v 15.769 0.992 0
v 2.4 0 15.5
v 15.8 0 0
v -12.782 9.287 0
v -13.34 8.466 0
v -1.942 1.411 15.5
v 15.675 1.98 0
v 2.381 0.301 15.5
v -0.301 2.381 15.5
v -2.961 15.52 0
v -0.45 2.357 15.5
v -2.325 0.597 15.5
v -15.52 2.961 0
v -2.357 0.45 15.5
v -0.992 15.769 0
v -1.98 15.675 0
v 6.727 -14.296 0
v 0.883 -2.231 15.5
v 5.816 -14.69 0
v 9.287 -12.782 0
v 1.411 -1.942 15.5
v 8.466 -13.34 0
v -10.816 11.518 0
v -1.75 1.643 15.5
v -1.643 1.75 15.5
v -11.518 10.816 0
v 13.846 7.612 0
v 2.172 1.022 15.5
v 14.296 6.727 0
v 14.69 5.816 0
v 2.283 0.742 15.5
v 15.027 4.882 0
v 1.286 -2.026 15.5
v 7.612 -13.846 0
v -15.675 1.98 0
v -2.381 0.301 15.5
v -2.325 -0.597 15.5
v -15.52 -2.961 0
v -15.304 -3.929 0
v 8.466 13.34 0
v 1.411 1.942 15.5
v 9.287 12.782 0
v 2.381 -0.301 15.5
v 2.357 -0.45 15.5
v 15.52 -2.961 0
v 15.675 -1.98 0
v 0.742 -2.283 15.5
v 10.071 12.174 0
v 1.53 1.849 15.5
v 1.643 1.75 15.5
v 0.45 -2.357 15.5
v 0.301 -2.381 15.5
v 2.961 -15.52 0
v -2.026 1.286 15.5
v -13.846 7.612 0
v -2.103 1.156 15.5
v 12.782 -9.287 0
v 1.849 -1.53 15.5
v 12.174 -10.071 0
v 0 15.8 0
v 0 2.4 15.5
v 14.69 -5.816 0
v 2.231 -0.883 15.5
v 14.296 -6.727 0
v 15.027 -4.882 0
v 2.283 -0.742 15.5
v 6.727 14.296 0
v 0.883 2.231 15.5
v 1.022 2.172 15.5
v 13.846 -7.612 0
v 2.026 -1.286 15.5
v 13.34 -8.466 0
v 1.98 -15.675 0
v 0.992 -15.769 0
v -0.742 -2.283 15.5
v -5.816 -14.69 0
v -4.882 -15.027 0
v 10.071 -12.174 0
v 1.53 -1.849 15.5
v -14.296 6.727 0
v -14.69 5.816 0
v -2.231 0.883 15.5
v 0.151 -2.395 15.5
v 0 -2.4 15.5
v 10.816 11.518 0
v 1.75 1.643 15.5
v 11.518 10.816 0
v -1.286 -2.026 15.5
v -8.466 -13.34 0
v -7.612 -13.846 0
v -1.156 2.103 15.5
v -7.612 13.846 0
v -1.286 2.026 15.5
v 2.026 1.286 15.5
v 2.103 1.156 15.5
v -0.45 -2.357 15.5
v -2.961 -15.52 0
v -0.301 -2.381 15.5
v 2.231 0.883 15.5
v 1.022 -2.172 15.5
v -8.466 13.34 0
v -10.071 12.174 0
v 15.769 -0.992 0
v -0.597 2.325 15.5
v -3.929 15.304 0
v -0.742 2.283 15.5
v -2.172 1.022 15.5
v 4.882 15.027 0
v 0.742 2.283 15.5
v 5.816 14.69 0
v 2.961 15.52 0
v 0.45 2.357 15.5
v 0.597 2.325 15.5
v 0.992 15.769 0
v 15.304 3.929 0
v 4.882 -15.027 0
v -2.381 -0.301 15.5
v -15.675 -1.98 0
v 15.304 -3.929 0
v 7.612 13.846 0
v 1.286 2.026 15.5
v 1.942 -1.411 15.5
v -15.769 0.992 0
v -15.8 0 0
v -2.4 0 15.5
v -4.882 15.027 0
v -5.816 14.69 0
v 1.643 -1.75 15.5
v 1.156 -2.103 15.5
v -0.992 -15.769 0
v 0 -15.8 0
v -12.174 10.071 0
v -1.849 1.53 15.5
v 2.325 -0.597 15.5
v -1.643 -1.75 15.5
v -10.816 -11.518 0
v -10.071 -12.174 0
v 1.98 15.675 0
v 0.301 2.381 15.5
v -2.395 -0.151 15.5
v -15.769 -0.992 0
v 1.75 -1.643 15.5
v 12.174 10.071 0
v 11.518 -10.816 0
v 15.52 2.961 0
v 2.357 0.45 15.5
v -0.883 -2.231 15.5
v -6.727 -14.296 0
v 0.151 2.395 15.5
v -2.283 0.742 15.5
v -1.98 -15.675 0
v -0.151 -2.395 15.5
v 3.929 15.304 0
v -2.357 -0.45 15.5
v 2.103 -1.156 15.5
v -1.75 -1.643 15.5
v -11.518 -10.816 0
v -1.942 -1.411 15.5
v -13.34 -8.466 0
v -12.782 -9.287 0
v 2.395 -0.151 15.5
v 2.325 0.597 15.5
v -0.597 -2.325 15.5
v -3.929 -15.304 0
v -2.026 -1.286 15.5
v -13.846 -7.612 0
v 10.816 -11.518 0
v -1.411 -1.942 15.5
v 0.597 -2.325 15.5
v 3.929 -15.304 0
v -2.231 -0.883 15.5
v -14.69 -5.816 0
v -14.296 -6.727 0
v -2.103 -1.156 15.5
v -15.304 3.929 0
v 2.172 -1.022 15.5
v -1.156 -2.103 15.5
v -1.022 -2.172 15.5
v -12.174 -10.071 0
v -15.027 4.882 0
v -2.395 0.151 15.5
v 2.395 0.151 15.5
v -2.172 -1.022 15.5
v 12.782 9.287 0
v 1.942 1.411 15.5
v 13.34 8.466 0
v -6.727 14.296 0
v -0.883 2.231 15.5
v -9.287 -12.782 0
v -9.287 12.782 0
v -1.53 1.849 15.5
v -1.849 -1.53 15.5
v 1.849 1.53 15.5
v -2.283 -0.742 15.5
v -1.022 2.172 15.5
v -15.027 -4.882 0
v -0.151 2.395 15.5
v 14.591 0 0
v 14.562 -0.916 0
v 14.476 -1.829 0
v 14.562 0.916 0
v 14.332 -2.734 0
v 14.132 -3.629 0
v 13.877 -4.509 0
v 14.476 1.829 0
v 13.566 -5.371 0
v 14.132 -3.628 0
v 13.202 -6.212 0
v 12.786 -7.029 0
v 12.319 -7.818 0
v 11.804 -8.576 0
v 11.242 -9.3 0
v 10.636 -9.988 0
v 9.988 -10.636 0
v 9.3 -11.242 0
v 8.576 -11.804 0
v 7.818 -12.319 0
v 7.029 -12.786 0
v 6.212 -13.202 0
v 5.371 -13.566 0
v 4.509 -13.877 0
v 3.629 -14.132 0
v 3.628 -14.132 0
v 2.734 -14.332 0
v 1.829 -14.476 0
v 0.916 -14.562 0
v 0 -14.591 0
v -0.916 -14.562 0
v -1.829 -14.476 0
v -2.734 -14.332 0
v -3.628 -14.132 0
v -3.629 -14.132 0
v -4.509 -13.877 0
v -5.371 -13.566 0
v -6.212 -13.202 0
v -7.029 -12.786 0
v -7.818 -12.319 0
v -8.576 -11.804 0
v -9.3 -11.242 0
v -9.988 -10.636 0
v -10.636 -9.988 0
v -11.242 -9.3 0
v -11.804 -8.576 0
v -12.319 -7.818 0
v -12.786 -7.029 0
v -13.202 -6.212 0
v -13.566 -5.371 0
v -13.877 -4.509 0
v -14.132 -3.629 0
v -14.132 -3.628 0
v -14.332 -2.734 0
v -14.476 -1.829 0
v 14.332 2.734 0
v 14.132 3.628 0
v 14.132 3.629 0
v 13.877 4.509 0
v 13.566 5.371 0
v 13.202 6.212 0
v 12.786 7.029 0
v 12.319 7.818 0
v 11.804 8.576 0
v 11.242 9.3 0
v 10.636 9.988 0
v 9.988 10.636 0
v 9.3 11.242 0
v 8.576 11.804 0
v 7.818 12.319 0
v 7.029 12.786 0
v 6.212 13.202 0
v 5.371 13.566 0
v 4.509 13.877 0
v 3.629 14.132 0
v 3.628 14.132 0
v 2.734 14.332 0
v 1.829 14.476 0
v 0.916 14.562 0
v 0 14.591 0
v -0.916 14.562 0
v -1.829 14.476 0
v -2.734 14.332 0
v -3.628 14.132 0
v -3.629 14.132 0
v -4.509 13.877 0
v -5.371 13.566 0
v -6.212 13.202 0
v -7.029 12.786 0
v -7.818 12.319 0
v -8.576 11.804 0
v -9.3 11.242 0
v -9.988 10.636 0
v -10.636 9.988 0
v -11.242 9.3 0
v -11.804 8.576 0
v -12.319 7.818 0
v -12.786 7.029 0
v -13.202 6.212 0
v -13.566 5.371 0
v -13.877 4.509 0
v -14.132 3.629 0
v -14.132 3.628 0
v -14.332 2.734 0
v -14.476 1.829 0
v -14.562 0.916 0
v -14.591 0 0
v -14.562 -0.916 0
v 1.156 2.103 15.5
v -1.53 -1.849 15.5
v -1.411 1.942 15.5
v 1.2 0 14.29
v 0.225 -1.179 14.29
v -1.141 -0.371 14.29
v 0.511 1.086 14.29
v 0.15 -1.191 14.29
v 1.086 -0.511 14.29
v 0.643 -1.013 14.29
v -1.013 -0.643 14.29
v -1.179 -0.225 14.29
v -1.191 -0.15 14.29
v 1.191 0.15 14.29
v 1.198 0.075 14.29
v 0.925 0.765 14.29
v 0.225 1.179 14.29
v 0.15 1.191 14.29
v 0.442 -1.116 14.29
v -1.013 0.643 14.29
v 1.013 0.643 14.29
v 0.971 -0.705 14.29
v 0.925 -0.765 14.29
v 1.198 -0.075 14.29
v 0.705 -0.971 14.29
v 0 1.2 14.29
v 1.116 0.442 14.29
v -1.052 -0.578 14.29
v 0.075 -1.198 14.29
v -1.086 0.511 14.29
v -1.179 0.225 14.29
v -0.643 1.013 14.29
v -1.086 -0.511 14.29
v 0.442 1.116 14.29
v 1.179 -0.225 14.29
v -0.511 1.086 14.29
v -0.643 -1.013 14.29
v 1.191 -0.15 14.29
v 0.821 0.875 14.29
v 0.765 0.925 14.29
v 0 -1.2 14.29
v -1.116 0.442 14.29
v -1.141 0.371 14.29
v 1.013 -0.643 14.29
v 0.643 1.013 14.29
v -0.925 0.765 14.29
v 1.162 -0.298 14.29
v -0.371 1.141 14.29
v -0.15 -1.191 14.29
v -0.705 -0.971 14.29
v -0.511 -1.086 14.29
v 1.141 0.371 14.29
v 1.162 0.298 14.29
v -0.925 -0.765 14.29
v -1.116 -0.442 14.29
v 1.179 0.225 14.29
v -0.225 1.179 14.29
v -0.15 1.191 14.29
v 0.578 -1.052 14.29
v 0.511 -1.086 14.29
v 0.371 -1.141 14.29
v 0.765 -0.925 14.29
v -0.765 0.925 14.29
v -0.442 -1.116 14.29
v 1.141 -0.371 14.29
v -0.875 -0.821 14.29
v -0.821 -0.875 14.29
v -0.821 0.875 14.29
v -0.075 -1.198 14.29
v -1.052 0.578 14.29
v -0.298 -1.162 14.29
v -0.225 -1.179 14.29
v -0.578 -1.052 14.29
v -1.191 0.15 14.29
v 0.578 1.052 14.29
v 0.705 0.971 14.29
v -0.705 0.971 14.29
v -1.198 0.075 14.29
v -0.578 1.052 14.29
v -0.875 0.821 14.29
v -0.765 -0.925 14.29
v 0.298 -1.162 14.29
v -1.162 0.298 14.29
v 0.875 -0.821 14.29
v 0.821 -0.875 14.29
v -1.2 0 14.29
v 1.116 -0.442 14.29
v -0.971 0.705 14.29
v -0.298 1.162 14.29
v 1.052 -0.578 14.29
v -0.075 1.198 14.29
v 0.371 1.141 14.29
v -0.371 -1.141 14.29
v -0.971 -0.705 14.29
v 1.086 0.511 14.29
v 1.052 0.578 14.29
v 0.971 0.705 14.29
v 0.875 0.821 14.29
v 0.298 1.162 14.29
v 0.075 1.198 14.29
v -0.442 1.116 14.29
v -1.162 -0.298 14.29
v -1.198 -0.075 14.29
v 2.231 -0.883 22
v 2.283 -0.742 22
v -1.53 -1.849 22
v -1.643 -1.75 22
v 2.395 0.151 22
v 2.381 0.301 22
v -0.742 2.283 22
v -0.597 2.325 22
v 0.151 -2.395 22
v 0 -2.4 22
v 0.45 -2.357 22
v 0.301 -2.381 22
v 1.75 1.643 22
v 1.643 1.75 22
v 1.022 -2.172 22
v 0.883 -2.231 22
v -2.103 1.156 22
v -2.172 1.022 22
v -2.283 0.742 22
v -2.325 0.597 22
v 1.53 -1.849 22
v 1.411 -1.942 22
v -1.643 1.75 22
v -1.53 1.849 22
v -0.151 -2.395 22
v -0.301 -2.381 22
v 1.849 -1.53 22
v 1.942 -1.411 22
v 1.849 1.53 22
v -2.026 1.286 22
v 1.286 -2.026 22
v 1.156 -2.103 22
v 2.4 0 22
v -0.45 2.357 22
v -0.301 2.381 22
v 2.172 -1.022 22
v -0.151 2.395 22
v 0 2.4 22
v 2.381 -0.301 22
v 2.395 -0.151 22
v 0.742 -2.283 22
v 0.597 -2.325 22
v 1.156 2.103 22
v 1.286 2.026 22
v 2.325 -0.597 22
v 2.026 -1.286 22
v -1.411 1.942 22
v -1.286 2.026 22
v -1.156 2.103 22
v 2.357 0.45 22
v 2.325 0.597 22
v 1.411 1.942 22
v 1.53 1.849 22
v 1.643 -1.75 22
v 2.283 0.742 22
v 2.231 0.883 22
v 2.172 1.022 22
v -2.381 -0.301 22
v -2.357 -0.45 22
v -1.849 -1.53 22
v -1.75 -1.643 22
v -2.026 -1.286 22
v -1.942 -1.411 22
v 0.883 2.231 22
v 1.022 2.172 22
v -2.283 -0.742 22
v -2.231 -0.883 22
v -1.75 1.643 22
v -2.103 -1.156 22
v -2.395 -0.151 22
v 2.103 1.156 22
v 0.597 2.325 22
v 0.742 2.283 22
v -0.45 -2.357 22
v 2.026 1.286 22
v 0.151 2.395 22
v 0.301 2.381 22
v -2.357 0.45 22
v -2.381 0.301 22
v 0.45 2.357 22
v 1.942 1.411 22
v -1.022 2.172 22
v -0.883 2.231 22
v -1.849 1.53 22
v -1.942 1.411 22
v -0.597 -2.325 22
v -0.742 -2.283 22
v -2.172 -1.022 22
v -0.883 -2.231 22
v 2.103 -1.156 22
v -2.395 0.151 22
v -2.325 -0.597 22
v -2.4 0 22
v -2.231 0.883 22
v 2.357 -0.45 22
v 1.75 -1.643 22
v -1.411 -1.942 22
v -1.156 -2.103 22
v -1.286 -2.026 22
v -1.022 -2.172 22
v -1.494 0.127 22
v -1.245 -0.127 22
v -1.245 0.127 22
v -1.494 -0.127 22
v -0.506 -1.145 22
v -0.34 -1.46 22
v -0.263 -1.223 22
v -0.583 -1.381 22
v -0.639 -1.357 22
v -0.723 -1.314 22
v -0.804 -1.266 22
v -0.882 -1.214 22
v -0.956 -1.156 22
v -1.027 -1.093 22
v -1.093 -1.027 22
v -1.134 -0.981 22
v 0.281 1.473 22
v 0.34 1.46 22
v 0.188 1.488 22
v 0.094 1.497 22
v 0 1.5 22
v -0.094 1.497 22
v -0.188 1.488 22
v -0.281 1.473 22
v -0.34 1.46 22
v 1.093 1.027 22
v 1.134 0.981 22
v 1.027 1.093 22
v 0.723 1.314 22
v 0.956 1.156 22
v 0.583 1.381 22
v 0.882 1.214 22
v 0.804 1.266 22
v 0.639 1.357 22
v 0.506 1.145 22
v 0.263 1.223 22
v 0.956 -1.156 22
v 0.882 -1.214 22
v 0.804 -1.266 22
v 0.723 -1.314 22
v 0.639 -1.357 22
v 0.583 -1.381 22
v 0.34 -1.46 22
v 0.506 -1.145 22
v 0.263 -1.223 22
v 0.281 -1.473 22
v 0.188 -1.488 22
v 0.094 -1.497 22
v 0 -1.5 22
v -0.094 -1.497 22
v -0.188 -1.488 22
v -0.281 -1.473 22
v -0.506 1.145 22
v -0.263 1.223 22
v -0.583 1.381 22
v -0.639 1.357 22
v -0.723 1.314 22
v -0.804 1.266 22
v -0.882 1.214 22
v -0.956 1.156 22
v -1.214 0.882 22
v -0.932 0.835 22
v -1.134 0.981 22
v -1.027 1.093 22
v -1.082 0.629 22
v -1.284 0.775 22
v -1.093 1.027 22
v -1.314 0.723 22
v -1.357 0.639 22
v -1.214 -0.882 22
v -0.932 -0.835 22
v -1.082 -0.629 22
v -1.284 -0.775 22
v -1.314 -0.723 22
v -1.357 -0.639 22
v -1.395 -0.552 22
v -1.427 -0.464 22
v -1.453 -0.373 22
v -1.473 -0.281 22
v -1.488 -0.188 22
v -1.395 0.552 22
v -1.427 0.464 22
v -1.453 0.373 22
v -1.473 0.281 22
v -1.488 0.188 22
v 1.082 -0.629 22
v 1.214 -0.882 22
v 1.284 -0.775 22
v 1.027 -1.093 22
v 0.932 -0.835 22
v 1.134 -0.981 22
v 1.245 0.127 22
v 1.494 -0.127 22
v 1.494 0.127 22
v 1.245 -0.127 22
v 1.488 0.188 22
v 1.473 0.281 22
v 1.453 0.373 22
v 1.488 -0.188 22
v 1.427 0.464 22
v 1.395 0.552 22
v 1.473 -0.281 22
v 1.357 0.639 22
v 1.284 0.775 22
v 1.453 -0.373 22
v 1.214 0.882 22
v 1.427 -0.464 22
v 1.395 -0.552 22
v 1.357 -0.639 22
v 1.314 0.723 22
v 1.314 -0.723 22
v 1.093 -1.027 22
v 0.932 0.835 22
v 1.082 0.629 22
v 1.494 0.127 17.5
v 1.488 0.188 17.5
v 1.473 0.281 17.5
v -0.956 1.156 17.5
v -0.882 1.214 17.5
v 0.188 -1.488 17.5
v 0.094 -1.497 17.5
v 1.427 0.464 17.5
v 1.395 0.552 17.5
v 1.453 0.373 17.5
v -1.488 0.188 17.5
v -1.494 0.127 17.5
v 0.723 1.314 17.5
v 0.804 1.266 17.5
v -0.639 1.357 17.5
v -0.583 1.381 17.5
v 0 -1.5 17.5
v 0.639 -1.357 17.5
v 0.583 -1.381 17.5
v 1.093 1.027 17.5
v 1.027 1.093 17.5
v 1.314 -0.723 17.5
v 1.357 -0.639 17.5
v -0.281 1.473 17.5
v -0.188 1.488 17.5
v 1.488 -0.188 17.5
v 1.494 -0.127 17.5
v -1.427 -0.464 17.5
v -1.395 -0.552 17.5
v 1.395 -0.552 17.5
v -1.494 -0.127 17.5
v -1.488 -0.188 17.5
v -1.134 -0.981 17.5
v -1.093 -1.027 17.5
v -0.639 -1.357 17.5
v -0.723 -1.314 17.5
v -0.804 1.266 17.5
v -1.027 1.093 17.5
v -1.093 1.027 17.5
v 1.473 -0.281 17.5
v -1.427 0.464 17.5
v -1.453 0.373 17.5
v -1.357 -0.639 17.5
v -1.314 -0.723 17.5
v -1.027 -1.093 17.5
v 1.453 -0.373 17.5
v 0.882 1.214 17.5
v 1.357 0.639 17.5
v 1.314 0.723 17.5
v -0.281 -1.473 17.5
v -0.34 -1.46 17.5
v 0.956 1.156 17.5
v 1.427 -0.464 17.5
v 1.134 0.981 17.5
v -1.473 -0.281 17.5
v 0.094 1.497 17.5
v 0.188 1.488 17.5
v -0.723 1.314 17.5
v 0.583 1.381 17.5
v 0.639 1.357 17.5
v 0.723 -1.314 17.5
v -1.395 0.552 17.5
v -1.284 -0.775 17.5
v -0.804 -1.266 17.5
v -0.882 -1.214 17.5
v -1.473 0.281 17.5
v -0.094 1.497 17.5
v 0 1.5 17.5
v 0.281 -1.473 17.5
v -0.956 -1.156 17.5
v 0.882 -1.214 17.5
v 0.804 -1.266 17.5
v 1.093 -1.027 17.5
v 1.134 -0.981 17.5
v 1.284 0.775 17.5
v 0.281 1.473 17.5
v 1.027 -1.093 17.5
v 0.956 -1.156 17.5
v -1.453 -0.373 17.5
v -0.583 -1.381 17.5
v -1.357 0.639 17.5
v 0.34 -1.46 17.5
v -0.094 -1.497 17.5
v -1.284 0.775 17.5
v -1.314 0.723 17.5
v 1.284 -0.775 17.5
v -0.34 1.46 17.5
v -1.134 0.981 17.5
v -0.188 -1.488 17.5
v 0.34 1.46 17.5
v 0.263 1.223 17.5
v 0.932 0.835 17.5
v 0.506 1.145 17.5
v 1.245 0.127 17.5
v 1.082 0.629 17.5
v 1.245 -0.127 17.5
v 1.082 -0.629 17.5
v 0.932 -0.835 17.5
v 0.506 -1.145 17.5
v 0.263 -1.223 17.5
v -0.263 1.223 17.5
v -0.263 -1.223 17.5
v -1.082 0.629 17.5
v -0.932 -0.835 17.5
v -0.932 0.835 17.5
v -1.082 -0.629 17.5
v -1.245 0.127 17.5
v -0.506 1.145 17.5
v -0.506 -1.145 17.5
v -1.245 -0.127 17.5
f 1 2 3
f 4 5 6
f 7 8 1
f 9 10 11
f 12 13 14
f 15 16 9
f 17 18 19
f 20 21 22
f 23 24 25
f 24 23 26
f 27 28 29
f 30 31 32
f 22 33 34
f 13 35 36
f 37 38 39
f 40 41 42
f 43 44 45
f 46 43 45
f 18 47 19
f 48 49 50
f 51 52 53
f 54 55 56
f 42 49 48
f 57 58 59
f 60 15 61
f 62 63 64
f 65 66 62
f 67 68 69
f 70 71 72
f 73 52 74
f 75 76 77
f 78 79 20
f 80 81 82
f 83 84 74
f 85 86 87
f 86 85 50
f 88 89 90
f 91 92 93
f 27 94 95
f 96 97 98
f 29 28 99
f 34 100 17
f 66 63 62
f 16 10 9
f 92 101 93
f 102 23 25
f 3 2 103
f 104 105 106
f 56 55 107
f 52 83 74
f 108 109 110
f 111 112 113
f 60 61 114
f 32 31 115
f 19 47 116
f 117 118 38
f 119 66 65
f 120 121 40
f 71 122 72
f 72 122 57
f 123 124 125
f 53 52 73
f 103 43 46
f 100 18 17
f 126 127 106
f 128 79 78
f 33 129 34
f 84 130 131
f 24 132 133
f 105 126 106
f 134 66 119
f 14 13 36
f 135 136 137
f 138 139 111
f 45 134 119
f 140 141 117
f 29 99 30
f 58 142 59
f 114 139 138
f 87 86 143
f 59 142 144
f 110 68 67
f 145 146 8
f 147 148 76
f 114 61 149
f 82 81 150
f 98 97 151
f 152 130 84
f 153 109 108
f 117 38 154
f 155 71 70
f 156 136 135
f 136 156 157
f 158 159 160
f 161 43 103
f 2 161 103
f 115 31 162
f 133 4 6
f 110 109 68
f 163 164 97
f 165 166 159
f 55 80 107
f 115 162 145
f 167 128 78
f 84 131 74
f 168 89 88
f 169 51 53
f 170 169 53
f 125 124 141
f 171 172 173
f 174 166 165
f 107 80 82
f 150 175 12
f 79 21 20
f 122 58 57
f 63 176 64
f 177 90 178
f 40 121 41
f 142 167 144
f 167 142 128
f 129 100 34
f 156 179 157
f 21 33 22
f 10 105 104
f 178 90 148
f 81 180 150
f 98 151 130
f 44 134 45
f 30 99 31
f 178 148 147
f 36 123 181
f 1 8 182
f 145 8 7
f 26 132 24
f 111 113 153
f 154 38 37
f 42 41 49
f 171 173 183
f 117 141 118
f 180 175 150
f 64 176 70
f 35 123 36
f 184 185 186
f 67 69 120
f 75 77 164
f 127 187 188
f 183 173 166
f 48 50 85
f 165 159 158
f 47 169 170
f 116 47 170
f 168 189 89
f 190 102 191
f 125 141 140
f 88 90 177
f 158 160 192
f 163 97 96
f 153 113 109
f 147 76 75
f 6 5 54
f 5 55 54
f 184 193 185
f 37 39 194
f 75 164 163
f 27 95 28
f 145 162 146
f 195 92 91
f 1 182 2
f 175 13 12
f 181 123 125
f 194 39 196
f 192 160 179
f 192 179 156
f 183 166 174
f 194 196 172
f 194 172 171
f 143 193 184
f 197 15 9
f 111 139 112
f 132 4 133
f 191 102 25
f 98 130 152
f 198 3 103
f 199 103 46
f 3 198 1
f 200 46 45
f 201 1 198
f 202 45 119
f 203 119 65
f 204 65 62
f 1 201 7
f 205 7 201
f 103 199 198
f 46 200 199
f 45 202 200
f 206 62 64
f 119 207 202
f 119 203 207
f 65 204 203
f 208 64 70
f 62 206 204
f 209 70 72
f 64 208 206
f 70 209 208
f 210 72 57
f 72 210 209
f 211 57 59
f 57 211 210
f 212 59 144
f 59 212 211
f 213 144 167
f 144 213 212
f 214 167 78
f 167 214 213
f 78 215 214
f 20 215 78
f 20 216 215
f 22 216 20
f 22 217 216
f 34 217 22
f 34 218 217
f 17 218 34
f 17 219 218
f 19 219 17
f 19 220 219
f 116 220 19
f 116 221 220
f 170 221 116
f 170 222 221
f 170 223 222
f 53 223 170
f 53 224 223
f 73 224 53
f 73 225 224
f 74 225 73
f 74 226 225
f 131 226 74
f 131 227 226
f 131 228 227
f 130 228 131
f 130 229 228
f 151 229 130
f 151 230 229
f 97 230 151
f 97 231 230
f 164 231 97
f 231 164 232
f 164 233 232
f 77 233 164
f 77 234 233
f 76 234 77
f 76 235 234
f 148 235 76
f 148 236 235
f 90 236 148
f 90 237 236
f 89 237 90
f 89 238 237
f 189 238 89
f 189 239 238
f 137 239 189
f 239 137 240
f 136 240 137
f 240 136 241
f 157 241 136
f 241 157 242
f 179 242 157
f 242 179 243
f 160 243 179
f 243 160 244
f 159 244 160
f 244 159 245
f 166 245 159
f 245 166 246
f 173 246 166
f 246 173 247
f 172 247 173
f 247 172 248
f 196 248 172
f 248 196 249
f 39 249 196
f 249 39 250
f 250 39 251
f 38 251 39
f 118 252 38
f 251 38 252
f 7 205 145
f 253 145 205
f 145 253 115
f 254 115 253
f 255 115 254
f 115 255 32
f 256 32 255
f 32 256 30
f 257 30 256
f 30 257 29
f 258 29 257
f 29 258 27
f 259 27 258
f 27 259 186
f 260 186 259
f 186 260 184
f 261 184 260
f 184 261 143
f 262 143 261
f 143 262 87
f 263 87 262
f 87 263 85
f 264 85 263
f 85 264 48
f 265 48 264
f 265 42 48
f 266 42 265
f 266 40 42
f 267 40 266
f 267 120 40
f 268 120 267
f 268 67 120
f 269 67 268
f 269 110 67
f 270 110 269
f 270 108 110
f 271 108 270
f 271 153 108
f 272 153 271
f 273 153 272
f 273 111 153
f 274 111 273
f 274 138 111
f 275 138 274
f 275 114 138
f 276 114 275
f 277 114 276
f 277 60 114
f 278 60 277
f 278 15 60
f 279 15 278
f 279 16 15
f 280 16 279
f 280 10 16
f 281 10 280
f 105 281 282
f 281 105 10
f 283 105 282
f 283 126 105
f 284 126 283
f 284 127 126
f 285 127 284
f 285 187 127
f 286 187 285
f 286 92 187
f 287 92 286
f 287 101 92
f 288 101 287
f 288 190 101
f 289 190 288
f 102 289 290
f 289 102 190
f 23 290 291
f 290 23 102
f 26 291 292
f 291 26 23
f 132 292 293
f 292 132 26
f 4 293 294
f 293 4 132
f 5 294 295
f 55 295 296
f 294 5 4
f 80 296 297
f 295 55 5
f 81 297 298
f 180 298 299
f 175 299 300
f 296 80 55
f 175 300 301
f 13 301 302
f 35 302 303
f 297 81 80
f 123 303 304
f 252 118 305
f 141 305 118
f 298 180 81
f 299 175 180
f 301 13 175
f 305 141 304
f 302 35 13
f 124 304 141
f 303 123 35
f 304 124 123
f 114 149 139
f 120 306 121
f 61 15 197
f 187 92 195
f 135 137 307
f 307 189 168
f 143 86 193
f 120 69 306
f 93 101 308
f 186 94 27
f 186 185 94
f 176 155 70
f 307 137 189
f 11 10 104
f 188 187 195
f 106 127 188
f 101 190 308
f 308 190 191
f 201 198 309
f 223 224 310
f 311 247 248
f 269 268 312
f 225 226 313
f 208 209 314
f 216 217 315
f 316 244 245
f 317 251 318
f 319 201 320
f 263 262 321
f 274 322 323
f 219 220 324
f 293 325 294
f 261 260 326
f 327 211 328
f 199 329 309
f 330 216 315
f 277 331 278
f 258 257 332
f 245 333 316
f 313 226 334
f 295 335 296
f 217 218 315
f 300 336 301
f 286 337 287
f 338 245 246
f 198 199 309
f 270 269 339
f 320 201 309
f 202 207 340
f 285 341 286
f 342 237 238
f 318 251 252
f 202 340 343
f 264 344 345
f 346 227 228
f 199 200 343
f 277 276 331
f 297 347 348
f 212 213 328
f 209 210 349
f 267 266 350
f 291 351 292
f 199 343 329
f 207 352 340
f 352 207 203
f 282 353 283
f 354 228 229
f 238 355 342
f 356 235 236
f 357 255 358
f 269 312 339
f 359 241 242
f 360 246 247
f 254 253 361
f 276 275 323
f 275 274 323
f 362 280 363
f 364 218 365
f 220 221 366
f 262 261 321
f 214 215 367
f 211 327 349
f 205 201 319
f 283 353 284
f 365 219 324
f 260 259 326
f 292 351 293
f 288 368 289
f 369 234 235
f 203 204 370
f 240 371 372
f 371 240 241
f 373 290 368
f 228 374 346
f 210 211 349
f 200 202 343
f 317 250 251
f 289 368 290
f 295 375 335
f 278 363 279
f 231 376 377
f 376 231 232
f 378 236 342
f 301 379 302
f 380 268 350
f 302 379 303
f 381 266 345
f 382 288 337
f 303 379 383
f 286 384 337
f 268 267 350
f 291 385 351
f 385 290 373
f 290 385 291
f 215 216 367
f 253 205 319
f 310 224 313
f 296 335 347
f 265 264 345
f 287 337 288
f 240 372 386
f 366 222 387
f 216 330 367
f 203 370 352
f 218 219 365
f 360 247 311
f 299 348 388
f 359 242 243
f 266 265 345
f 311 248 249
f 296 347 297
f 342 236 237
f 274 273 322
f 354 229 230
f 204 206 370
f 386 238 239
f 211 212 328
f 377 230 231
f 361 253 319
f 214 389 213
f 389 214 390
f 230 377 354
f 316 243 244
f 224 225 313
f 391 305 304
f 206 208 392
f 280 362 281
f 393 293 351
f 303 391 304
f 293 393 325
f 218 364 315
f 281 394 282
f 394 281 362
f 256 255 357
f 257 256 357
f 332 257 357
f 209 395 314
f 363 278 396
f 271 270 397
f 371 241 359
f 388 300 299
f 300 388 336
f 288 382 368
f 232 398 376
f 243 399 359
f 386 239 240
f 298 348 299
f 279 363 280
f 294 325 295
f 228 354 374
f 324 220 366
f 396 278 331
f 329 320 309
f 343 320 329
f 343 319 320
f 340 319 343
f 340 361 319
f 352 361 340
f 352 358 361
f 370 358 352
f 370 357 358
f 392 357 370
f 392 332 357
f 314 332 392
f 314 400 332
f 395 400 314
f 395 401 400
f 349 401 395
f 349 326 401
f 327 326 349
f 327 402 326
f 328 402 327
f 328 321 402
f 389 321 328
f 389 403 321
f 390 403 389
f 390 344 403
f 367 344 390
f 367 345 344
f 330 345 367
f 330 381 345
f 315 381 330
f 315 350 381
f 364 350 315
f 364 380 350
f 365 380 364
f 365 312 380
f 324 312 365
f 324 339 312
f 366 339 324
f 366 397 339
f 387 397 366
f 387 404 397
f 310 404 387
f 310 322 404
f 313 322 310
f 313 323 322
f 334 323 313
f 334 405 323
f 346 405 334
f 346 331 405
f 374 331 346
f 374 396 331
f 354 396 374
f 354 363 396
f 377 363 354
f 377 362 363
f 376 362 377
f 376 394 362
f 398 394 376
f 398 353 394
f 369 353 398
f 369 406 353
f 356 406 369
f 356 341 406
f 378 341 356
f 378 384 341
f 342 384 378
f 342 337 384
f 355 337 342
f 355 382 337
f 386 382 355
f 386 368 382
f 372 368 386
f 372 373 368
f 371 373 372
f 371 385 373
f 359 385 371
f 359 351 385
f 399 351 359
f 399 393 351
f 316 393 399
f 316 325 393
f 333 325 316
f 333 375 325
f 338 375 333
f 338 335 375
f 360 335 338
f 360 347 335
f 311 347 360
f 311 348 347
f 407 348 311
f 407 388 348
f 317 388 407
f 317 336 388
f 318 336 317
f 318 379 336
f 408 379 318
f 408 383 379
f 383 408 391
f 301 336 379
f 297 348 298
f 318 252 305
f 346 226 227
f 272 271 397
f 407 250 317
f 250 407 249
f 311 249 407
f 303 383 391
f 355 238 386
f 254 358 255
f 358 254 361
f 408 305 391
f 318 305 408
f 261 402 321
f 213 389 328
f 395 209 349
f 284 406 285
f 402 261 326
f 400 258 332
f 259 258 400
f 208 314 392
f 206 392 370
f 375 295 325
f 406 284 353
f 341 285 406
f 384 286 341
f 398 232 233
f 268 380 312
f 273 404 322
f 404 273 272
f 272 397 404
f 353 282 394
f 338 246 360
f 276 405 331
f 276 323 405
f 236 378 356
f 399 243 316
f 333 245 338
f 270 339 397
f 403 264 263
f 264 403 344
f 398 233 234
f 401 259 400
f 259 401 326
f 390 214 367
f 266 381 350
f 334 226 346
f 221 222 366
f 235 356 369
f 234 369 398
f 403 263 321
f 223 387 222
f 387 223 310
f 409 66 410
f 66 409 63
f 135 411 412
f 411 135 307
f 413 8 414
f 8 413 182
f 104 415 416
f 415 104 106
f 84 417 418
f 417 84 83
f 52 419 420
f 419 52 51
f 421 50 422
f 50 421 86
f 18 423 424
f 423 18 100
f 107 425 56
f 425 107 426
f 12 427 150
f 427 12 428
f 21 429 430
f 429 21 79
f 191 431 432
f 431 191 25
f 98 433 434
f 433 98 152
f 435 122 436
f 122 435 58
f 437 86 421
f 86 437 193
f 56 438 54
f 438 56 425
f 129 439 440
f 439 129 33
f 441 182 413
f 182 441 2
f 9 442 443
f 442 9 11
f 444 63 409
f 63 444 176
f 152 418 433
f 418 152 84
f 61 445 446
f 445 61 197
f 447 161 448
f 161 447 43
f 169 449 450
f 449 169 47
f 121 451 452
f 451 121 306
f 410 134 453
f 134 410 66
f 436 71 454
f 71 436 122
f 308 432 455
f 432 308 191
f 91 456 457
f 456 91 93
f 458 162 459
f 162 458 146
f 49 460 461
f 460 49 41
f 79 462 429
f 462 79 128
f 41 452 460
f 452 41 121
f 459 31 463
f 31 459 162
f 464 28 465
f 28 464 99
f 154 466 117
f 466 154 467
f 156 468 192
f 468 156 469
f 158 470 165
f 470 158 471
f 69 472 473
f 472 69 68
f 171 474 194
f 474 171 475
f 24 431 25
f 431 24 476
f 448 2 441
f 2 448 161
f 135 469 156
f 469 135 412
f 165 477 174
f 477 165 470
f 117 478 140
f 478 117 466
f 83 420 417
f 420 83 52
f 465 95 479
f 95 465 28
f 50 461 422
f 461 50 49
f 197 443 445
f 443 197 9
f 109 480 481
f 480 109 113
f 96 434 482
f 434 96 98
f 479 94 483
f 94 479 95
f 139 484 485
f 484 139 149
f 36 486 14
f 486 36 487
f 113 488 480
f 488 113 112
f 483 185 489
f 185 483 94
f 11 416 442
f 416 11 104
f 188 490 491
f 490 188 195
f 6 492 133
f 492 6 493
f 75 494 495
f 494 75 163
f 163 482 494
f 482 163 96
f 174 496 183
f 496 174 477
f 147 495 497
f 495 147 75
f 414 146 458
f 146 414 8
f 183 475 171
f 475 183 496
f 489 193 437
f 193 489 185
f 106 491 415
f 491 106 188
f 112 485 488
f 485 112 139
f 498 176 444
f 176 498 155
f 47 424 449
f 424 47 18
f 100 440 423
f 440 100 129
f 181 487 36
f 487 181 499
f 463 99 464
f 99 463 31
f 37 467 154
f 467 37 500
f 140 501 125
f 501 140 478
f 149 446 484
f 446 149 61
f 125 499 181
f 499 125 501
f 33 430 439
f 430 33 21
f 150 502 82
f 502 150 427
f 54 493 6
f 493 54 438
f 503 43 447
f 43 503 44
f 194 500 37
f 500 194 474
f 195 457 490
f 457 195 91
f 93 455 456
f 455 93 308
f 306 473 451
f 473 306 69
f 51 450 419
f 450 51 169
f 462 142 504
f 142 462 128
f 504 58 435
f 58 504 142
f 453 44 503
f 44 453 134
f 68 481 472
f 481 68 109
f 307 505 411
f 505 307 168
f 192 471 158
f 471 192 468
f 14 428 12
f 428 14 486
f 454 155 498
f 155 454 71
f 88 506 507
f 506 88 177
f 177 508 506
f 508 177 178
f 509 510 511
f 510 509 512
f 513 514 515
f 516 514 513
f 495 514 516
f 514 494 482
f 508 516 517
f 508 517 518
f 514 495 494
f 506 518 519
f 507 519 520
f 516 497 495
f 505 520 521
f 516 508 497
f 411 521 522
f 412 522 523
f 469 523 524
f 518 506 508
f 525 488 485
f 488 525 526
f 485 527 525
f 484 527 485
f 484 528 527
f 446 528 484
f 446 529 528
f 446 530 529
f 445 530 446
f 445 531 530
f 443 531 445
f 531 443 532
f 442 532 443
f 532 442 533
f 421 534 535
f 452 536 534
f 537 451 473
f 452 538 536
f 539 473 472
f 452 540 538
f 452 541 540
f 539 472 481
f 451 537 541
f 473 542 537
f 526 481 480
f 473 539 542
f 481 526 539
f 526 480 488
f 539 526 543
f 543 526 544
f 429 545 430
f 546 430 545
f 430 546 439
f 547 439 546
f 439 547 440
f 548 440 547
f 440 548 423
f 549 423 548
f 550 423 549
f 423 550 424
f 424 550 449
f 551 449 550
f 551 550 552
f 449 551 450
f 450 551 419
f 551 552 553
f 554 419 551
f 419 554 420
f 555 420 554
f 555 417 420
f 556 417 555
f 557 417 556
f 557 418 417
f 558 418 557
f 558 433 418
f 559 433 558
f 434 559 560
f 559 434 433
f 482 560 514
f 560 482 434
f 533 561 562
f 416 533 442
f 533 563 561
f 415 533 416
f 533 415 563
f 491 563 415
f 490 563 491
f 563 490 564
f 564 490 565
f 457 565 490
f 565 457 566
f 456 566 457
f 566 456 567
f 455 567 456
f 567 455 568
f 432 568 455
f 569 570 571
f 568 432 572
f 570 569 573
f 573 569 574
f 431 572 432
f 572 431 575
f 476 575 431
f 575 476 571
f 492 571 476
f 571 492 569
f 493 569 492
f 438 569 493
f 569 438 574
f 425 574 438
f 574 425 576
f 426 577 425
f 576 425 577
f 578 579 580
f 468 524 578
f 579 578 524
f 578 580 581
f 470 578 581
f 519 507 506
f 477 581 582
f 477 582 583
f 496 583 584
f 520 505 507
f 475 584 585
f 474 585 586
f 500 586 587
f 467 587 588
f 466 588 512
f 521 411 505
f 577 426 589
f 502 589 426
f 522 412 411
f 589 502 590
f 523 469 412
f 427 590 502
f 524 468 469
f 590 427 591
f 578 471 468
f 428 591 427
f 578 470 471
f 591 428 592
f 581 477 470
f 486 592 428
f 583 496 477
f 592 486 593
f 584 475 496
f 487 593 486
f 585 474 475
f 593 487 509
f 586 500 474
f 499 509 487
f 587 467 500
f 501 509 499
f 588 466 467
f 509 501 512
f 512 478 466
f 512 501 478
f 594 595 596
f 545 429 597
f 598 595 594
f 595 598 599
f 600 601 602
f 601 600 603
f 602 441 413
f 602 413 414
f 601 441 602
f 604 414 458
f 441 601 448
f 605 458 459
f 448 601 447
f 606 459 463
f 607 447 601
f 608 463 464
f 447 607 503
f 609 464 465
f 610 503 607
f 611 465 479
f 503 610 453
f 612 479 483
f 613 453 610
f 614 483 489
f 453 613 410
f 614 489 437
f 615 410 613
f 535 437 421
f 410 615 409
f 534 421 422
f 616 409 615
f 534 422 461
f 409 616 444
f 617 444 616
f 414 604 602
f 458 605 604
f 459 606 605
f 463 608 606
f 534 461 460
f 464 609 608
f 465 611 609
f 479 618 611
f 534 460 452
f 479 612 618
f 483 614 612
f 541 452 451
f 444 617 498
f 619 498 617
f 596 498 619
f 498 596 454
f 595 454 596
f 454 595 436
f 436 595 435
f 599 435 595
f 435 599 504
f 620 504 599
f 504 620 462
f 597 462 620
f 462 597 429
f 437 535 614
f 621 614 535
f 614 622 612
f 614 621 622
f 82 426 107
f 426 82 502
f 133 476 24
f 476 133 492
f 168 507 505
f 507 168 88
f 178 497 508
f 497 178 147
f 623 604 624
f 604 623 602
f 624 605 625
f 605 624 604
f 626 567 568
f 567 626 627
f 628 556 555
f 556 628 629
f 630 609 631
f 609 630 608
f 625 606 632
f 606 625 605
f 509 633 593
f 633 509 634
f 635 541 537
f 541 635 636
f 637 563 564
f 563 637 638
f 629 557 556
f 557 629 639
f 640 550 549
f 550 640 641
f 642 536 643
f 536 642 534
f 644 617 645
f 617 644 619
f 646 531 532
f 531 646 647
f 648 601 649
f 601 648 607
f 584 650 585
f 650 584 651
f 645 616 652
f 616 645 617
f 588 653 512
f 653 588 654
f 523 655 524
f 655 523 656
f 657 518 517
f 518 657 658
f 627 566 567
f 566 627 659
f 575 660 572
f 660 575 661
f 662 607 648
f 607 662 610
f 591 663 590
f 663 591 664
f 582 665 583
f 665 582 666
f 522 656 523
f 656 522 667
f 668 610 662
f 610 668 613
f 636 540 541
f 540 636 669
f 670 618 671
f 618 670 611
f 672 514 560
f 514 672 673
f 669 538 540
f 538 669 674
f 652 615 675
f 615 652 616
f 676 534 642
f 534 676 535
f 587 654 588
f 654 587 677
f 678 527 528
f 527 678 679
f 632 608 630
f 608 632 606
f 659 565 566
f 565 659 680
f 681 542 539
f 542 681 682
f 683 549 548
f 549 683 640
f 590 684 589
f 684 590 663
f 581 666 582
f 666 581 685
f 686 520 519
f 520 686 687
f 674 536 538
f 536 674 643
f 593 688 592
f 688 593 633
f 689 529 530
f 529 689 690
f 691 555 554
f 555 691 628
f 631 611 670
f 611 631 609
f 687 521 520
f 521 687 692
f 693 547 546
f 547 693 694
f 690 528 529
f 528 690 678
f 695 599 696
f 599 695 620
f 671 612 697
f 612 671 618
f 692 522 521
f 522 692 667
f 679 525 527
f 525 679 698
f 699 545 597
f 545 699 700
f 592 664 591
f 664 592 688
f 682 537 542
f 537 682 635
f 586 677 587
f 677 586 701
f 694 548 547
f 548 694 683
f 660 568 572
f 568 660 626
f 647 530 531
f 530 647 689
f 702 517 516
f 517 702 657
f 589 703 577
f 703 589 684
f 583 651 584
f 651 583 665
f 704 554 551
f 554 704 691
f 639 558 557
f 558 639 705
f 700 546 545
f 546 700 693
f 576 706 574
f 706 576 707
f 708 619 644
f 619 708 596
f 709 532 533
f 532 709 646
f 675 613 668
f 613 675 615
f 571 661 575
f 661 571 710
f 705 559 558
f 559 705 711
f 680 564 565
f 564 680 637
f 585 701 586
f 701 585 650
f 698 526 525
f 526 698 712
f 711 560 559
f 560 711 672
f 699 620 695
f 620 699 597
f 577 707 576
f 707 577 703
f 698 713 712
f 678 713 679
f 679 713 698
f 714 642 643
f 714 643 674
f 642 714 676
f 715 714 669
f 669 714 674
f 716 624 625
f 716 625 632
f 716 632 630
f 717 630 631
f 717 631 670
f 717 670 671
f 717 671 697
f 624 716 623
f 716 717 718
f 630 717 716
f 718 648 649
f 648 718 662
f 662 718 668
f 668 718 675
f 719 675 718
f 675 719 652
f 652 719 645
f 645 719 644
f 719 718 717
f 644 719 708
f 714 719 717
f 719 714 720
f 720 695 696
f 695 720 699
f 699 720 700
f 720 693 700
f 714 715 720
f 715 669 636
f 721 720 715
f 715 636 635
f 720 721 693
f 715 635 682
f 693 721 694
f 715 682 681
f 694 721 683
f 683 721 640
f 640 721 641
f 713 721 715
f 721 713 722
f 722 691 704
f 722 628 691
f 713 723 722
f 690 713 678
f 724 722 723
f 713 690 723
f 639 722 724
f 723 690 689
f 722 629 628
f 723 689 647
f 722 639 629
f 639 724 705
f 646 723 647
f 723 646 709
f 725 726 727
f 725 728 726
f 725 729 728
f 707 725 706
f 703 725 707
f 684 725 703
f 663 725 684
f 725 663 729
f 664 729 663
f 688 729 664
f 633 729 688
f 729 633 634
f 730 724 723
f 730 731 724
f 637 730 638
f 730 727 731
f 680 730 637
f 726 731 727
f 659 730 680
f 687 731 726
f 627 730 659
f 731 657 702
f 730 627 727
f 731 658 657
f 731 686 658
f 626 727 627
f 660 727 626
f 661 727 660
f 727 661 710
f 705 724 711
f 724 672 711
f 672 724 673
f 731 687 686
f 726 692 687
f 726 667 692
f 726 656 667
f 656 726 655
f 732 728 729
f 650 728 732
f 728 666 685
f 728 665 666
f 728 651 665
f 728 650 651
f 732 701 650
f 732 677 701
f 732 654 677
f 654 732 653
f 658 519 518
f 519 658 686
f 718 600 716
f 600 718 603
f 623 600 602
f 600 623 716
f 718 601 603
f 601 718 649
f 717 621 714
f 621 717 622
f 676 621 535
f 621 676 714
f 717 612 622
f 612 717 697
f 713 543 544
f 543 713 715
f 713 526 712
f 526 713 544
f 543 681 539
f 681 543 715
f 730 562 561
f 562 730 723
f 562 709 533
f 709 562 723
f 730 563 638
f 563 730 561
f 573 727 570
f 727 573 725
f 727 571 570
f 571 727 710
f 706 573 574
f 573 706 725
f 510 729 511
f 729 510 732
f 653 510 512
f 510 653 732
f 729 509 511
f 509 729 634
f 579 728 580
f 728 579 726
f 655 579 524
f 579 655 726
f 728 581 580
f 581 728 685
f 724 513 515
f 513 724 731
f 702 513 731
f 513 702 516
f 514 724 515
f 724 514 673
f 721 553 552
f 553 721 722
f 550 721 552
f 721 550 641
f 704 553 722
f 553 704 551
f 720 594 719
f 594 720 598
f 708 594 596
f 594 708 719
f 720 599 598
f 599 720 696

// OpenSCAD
// [FL_INDEX: keywords="openscad, 3d_parametric, Dart_cone_for_blowgun, csg_solid" | COT="Parametric OpenSCAD design from 3DCodeverse"]
// Title: Dart cone for blowgun

$fn=100;
pad=0.01;

//cone params
cone_caliber=15.8; //(.625 inches in mm ) / 2 - fudge
cone_thickness=1.2;
cone_height=15.5;

//bolt cup params
bolt_radius=1.5;
cup_height=6.5;
cup_thickness=.9;

//bolt cup spine params
spine_thickness=.255;
spine_count=10;


//cone
module cone() {
	difference() {
		cylinder( h = cone_height, r1=cone_caliber, r2=bolt_radius+cup_thickness);
		translate([0,0,0-pad]){
			cylinder( h = cone_height-cone_thickness, r1=cone_caliber-cone_thickness, r2=bolt_radius+cup_thickness-cone_thickness);
		}
	};
};

//bolt cup
module bolt_cup() {
	//cup
	difference() {
		cylinder( h = cup_height, r = bolt_radius+cup_thickness);
		translate([0,0,2]){
			cylinder( h = cup_height-cup_thickness+pad, r = bolt_radius);
		}
	}; 
	
	//cup spines
	for (i=[0:spine_count-1]) {
		rotate( i*360/spine_count, [0,0,1] ) {
			translate([bolt_radius-spine_thickness,-(spine_thickness/2),0]){
				cube([spine_thickness,spine_thickness,cup_height]);
			}
		}
	};
};

cone();
translate([0,0,cone_height]){
	bolt_cup();
}
